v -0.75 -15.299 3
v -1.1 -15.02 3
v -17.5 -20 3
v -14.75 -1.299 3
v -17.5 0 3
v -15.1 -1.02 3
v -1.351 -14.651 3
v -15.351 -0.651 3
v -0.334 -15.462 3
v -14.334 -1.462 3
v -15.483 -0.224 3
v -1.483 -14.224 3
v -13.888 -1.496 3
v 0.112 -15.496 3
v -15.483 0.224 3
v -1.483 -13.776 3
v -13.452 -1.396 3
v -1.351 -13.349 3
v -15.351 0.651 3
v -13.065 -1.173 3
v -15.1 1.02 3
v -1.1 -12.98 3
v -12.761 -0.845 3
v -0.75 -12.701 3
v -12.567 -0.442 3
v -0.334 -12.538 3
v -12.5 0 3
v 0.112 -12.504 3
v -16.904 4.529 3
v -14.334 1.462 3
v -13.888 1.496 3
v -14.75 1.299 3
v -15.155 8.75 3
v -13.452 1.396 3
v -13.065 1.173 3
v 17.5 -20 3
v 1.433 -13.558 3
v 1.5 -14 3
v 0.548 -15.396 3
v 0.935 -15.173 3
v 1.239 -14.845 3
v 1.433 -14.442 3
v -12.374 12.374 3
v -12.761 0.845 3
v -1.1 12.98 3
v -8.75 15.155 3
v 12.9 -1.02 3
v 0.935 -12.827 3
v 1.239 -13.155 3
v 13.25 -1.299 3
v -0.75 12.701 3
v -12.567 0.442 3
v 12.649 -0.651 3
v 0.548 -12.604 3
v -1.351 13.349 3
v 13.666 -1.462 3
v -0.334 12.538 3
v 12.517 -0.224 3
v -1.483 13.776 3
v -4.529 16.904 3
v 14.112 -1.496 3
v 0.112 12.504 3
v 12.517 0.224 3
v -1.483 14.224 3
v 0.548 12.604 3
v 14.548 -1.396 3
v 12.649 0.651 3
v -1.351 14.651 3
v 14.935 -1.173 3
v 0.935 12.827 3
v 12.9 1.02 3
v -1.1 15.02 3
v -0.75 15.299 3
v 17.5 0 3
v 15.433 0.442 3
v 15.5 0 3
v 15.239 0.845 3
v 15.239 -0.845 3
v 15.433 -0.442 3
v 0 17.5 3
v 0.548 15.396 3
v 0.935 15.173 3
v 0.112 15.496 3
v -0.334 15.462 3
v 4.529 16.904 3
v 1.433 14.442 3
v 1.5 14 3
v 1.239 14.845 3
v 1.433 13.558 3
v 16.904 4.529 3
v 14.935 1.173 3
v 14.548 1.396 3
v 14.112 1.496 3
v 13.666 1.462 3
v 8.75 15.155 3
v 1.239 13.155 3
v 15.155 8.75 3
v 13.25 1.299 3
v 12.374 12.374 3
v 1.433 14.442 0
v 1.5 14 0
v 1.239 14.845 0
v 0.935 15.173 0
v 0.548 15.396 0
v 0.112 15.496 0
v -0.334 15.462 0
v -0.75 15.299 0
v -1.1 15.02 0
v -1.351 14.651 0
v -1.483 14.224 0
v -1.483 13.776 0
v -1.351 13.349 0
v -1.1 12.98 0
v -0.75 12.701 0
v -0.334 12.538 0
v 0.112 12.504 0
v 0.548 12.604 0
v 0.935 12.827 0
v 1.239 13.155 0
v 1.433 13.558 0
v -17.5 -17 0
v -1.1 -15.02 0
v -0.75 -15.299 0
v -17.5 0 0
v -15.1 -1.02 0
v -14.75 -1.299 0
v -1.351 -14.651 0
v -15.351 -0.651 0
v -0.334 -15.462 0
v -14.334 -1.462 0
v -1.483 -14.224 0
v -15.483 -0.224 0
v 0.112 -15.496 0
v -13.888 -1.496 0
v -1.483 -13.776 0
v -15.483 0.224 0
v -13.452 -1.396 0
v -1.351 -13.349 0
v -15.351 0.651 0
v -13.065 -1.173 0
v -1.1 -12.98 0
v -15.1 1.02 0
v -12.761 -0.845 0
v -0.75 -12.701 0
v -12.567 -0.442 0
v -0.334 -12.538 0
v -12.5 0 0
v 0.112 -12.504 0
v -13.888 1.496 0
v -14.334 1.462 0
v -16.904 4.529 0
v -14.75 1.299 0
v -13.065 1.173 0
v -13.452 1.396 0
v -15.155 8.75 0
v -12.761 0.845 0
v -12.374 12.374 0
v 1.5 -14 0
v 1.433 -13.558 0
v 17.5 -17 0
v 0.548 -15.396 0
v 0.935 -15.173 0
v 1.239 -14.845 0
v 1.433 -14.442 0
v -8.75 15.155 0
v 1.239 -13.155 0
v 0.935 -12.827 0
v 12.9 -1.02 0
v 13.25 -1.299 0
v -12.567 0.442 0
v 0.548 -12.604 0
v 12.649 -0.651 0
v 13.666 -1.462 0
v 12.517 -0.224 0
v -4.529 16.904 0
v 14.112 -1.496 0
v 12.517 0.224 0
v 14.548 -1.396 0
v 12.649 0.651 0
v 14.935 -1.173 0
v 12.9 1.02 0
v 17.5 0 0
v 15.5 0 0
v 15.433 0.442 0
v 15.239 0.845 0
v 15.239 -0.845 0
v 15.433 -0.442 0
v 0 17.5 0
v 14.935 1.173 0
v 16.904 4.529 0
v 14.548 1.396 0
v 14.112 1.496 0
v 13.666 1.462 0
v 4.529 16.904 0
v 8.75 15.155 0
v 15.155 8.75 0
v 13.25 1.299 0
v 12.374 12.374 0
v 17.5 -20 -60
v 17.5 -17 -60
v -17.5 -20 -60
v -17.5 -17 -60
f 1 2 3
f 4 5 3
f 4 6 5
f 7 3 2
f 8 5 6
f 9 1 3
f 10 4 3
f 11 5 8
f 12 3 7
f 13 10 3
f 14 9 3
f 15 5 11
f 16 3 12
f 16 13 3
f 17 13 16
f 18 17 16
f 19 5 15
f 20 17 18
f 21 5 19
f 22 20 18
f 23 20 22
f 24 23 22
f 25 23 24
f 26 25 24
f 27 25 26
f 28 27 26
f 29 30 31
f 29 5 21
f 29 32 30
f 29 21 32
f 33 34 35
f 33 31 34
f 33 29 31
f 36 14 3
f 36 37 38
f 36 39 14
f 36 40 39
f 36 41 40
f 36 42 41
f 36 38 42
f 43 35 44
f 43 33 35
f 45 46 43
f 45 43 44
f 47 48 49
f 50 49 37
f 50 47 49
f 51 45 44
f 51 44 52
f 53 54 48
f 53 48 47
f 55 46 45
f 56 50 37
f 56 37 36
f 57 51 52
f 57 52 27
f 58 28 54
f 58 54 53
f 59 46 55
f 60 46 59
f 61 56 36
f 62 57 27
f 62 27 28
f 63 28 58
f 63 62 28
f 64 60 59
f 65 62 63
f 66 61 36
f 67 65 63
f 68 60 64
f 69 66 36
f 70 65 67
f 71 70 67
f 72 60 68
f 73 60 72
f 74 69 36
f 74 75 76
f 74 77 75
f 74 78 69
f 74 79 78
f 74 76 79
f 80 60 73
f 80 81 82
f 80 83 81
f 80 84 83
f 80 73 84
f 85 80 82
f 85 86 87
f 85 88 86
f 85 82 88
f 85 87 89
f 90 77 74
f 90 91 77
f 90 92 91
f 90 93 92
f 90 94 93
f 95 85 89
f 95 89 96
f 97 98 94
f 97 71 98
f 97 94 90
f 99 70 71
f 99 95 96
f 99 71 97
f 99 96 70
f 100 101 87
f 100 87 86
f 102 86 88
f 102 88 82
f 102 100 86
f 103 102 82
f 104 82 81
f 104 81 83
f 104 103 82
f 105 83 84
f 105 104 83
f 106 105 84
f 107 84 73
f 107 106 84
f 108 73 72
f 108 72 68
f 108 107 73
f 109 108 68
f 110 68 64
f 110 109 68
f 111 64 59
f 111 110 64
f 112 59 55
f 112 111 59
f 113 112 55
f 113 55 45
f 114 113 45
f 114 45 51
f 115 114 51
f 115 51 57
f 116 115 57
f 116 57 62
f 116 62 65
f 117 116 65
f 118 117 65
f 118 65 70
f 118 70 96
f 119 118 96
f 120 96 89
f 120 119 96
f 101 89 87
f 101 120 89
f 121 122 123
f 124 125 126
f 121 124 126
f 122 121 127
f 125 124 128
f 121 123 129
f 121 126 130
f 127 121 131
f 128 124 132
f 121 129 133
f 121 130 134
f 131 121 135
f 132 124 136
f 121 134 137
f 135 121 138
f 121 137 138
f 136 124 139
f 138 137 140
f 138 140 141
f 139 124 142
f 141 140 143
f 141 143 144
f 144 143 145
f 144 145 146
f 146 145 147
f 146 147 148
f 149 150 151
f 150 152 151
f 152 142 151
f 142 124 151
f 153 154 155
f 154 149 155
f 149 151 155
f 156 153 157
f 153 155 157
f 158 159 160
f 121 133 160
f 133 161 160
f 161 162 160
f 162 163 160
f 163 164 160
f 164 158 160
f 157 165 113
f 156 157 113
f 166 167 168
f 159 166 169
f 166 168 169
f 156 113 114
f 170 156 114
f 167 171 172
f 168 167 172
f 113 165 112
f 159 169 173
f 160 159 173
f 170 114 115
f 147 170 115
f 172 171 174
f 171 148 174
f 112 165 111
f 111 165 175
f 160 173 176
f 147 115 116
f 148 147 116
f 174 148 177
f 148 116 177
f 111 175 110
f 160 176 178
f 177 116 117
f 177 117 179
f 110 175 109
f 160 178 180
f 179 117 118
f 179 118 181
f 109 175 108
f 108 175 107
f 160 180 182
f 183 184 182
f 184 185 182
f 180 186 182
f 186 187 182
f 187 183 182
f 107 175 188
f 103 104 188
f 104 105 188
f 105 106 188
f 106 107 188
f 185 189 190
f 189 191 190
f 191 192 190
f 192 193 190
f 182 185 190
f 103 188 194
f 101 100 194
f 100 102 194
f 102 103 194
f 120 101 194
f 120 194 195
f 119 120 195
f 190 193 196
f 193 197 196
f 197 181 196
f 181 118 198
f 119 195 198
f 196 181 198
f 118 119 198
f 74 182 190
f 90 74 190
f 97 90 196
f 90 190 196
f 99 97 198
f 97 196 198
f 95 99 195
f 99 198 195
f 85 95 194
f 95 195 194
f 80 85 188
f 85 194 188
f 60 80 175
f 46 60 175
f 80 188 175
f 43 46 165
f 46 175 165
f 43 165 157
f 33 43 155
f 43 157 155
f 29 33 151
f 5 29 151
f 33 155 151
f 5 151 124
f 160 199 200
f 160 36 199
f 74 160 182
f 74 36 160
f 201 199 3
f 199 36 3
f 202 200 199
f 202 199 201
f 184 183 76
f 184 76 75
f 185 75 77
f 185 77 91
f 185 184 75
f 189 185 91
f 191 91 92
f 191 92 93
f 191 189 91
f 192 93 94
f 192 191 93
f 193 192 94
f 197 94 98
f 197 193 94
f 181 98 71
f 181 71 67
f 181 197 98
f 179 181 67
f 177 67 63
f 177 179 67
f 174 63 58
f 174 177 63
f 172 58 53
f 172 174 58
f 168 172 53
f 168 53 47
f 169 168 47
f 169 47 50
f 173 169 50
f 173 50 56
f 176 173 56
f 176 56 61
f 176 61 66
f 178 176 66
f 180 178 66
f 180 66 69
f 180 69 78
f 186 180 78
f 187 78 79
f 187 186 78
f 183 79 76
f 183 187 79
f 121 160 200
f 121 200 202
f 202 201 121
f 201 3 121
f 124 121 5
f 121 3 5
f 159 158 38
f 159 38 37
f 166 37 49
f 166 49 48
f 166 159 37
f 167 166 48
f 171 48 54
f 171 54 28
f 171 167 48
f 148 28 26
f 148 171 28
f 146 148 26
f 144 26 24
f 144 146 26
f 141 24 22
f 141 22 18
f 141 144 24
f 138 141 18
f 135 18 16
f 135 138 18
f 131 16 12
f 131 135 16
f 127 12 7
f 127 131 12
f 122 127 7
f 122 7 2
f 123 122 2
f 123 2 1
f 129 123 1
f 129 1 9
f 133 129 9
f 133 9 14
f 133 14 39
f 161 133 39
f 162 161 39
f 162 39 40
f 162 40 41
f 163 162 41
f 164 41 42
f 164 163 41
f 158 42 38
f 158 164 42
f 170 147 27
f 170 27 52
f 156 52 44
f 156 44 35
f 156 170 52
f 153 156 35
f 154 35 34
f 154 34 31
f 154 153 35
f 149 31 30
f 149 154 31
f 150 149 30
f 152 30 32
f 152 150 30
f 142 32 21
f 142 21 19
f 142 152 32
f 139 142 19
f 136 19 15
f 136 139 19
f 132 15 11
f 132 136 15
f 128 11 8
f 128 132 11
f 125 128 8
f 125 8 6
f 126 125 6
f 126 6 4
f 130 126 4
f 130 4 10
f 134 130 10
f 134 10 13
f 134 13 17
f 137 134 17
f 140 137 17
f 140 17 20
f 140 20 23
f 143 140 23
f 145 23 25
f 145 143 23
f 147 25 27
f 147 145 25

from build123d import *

# Parameters (mm, degrees)
SKETCH1_R           = 1.5
BOSS_EXTRUDE1_DEPTH = 3
SKETCH2_W           = 35
SKETCH2_H           = 3
BOSS_EXTRUDE2_DEPTH = 60


with BuildPart() as part:
    # Sketch1 → Boss-Extrude1 (new body)
    with BuildSketch(Plane.XY):
        with BuildLine():
            Line((-17.5, 0), (-17.5, -20))
            Line((-17.5, -20), (17.5, -20))
            Line((17.5, -20), (17.5, 0))
            ThreePointArc((17.5, 0), (0, 17.5), (-17.5, 0))
        make_face()
        with Locations((0, 14)):
            Circle(SKETCH1_R, mode=Mode.SUBTRACT)
        with Locations((14, 0)):
            Circle(SKETCH1_R, mode=Mode.SUBTRACT)
        with Locations((0, -14)):
            Circle(SKETCH1_R, mode=Mode.SUBTRACT)
        with Locations((-14, 0)):
            Circle(SKETCH1_R, mode=Mode.SUBTRACT)
    extrude(amount=BOSS_EXTRUDE1_DEPTH)

    # Sketch2 → Boss-Extrude2 (add)
    with BuildSketch(Plane(origin=(0, 0, 0), x_dir=(-1, 0, 0), z_dir=(0, 0, -1))):
        with Locations((0, -18.5)):
            Rectangle(SKETCH2_W, SKETCH2_H)
    extrude(amount=BOSS_EXTRUDE2_DEPTH)


solid = part.part
